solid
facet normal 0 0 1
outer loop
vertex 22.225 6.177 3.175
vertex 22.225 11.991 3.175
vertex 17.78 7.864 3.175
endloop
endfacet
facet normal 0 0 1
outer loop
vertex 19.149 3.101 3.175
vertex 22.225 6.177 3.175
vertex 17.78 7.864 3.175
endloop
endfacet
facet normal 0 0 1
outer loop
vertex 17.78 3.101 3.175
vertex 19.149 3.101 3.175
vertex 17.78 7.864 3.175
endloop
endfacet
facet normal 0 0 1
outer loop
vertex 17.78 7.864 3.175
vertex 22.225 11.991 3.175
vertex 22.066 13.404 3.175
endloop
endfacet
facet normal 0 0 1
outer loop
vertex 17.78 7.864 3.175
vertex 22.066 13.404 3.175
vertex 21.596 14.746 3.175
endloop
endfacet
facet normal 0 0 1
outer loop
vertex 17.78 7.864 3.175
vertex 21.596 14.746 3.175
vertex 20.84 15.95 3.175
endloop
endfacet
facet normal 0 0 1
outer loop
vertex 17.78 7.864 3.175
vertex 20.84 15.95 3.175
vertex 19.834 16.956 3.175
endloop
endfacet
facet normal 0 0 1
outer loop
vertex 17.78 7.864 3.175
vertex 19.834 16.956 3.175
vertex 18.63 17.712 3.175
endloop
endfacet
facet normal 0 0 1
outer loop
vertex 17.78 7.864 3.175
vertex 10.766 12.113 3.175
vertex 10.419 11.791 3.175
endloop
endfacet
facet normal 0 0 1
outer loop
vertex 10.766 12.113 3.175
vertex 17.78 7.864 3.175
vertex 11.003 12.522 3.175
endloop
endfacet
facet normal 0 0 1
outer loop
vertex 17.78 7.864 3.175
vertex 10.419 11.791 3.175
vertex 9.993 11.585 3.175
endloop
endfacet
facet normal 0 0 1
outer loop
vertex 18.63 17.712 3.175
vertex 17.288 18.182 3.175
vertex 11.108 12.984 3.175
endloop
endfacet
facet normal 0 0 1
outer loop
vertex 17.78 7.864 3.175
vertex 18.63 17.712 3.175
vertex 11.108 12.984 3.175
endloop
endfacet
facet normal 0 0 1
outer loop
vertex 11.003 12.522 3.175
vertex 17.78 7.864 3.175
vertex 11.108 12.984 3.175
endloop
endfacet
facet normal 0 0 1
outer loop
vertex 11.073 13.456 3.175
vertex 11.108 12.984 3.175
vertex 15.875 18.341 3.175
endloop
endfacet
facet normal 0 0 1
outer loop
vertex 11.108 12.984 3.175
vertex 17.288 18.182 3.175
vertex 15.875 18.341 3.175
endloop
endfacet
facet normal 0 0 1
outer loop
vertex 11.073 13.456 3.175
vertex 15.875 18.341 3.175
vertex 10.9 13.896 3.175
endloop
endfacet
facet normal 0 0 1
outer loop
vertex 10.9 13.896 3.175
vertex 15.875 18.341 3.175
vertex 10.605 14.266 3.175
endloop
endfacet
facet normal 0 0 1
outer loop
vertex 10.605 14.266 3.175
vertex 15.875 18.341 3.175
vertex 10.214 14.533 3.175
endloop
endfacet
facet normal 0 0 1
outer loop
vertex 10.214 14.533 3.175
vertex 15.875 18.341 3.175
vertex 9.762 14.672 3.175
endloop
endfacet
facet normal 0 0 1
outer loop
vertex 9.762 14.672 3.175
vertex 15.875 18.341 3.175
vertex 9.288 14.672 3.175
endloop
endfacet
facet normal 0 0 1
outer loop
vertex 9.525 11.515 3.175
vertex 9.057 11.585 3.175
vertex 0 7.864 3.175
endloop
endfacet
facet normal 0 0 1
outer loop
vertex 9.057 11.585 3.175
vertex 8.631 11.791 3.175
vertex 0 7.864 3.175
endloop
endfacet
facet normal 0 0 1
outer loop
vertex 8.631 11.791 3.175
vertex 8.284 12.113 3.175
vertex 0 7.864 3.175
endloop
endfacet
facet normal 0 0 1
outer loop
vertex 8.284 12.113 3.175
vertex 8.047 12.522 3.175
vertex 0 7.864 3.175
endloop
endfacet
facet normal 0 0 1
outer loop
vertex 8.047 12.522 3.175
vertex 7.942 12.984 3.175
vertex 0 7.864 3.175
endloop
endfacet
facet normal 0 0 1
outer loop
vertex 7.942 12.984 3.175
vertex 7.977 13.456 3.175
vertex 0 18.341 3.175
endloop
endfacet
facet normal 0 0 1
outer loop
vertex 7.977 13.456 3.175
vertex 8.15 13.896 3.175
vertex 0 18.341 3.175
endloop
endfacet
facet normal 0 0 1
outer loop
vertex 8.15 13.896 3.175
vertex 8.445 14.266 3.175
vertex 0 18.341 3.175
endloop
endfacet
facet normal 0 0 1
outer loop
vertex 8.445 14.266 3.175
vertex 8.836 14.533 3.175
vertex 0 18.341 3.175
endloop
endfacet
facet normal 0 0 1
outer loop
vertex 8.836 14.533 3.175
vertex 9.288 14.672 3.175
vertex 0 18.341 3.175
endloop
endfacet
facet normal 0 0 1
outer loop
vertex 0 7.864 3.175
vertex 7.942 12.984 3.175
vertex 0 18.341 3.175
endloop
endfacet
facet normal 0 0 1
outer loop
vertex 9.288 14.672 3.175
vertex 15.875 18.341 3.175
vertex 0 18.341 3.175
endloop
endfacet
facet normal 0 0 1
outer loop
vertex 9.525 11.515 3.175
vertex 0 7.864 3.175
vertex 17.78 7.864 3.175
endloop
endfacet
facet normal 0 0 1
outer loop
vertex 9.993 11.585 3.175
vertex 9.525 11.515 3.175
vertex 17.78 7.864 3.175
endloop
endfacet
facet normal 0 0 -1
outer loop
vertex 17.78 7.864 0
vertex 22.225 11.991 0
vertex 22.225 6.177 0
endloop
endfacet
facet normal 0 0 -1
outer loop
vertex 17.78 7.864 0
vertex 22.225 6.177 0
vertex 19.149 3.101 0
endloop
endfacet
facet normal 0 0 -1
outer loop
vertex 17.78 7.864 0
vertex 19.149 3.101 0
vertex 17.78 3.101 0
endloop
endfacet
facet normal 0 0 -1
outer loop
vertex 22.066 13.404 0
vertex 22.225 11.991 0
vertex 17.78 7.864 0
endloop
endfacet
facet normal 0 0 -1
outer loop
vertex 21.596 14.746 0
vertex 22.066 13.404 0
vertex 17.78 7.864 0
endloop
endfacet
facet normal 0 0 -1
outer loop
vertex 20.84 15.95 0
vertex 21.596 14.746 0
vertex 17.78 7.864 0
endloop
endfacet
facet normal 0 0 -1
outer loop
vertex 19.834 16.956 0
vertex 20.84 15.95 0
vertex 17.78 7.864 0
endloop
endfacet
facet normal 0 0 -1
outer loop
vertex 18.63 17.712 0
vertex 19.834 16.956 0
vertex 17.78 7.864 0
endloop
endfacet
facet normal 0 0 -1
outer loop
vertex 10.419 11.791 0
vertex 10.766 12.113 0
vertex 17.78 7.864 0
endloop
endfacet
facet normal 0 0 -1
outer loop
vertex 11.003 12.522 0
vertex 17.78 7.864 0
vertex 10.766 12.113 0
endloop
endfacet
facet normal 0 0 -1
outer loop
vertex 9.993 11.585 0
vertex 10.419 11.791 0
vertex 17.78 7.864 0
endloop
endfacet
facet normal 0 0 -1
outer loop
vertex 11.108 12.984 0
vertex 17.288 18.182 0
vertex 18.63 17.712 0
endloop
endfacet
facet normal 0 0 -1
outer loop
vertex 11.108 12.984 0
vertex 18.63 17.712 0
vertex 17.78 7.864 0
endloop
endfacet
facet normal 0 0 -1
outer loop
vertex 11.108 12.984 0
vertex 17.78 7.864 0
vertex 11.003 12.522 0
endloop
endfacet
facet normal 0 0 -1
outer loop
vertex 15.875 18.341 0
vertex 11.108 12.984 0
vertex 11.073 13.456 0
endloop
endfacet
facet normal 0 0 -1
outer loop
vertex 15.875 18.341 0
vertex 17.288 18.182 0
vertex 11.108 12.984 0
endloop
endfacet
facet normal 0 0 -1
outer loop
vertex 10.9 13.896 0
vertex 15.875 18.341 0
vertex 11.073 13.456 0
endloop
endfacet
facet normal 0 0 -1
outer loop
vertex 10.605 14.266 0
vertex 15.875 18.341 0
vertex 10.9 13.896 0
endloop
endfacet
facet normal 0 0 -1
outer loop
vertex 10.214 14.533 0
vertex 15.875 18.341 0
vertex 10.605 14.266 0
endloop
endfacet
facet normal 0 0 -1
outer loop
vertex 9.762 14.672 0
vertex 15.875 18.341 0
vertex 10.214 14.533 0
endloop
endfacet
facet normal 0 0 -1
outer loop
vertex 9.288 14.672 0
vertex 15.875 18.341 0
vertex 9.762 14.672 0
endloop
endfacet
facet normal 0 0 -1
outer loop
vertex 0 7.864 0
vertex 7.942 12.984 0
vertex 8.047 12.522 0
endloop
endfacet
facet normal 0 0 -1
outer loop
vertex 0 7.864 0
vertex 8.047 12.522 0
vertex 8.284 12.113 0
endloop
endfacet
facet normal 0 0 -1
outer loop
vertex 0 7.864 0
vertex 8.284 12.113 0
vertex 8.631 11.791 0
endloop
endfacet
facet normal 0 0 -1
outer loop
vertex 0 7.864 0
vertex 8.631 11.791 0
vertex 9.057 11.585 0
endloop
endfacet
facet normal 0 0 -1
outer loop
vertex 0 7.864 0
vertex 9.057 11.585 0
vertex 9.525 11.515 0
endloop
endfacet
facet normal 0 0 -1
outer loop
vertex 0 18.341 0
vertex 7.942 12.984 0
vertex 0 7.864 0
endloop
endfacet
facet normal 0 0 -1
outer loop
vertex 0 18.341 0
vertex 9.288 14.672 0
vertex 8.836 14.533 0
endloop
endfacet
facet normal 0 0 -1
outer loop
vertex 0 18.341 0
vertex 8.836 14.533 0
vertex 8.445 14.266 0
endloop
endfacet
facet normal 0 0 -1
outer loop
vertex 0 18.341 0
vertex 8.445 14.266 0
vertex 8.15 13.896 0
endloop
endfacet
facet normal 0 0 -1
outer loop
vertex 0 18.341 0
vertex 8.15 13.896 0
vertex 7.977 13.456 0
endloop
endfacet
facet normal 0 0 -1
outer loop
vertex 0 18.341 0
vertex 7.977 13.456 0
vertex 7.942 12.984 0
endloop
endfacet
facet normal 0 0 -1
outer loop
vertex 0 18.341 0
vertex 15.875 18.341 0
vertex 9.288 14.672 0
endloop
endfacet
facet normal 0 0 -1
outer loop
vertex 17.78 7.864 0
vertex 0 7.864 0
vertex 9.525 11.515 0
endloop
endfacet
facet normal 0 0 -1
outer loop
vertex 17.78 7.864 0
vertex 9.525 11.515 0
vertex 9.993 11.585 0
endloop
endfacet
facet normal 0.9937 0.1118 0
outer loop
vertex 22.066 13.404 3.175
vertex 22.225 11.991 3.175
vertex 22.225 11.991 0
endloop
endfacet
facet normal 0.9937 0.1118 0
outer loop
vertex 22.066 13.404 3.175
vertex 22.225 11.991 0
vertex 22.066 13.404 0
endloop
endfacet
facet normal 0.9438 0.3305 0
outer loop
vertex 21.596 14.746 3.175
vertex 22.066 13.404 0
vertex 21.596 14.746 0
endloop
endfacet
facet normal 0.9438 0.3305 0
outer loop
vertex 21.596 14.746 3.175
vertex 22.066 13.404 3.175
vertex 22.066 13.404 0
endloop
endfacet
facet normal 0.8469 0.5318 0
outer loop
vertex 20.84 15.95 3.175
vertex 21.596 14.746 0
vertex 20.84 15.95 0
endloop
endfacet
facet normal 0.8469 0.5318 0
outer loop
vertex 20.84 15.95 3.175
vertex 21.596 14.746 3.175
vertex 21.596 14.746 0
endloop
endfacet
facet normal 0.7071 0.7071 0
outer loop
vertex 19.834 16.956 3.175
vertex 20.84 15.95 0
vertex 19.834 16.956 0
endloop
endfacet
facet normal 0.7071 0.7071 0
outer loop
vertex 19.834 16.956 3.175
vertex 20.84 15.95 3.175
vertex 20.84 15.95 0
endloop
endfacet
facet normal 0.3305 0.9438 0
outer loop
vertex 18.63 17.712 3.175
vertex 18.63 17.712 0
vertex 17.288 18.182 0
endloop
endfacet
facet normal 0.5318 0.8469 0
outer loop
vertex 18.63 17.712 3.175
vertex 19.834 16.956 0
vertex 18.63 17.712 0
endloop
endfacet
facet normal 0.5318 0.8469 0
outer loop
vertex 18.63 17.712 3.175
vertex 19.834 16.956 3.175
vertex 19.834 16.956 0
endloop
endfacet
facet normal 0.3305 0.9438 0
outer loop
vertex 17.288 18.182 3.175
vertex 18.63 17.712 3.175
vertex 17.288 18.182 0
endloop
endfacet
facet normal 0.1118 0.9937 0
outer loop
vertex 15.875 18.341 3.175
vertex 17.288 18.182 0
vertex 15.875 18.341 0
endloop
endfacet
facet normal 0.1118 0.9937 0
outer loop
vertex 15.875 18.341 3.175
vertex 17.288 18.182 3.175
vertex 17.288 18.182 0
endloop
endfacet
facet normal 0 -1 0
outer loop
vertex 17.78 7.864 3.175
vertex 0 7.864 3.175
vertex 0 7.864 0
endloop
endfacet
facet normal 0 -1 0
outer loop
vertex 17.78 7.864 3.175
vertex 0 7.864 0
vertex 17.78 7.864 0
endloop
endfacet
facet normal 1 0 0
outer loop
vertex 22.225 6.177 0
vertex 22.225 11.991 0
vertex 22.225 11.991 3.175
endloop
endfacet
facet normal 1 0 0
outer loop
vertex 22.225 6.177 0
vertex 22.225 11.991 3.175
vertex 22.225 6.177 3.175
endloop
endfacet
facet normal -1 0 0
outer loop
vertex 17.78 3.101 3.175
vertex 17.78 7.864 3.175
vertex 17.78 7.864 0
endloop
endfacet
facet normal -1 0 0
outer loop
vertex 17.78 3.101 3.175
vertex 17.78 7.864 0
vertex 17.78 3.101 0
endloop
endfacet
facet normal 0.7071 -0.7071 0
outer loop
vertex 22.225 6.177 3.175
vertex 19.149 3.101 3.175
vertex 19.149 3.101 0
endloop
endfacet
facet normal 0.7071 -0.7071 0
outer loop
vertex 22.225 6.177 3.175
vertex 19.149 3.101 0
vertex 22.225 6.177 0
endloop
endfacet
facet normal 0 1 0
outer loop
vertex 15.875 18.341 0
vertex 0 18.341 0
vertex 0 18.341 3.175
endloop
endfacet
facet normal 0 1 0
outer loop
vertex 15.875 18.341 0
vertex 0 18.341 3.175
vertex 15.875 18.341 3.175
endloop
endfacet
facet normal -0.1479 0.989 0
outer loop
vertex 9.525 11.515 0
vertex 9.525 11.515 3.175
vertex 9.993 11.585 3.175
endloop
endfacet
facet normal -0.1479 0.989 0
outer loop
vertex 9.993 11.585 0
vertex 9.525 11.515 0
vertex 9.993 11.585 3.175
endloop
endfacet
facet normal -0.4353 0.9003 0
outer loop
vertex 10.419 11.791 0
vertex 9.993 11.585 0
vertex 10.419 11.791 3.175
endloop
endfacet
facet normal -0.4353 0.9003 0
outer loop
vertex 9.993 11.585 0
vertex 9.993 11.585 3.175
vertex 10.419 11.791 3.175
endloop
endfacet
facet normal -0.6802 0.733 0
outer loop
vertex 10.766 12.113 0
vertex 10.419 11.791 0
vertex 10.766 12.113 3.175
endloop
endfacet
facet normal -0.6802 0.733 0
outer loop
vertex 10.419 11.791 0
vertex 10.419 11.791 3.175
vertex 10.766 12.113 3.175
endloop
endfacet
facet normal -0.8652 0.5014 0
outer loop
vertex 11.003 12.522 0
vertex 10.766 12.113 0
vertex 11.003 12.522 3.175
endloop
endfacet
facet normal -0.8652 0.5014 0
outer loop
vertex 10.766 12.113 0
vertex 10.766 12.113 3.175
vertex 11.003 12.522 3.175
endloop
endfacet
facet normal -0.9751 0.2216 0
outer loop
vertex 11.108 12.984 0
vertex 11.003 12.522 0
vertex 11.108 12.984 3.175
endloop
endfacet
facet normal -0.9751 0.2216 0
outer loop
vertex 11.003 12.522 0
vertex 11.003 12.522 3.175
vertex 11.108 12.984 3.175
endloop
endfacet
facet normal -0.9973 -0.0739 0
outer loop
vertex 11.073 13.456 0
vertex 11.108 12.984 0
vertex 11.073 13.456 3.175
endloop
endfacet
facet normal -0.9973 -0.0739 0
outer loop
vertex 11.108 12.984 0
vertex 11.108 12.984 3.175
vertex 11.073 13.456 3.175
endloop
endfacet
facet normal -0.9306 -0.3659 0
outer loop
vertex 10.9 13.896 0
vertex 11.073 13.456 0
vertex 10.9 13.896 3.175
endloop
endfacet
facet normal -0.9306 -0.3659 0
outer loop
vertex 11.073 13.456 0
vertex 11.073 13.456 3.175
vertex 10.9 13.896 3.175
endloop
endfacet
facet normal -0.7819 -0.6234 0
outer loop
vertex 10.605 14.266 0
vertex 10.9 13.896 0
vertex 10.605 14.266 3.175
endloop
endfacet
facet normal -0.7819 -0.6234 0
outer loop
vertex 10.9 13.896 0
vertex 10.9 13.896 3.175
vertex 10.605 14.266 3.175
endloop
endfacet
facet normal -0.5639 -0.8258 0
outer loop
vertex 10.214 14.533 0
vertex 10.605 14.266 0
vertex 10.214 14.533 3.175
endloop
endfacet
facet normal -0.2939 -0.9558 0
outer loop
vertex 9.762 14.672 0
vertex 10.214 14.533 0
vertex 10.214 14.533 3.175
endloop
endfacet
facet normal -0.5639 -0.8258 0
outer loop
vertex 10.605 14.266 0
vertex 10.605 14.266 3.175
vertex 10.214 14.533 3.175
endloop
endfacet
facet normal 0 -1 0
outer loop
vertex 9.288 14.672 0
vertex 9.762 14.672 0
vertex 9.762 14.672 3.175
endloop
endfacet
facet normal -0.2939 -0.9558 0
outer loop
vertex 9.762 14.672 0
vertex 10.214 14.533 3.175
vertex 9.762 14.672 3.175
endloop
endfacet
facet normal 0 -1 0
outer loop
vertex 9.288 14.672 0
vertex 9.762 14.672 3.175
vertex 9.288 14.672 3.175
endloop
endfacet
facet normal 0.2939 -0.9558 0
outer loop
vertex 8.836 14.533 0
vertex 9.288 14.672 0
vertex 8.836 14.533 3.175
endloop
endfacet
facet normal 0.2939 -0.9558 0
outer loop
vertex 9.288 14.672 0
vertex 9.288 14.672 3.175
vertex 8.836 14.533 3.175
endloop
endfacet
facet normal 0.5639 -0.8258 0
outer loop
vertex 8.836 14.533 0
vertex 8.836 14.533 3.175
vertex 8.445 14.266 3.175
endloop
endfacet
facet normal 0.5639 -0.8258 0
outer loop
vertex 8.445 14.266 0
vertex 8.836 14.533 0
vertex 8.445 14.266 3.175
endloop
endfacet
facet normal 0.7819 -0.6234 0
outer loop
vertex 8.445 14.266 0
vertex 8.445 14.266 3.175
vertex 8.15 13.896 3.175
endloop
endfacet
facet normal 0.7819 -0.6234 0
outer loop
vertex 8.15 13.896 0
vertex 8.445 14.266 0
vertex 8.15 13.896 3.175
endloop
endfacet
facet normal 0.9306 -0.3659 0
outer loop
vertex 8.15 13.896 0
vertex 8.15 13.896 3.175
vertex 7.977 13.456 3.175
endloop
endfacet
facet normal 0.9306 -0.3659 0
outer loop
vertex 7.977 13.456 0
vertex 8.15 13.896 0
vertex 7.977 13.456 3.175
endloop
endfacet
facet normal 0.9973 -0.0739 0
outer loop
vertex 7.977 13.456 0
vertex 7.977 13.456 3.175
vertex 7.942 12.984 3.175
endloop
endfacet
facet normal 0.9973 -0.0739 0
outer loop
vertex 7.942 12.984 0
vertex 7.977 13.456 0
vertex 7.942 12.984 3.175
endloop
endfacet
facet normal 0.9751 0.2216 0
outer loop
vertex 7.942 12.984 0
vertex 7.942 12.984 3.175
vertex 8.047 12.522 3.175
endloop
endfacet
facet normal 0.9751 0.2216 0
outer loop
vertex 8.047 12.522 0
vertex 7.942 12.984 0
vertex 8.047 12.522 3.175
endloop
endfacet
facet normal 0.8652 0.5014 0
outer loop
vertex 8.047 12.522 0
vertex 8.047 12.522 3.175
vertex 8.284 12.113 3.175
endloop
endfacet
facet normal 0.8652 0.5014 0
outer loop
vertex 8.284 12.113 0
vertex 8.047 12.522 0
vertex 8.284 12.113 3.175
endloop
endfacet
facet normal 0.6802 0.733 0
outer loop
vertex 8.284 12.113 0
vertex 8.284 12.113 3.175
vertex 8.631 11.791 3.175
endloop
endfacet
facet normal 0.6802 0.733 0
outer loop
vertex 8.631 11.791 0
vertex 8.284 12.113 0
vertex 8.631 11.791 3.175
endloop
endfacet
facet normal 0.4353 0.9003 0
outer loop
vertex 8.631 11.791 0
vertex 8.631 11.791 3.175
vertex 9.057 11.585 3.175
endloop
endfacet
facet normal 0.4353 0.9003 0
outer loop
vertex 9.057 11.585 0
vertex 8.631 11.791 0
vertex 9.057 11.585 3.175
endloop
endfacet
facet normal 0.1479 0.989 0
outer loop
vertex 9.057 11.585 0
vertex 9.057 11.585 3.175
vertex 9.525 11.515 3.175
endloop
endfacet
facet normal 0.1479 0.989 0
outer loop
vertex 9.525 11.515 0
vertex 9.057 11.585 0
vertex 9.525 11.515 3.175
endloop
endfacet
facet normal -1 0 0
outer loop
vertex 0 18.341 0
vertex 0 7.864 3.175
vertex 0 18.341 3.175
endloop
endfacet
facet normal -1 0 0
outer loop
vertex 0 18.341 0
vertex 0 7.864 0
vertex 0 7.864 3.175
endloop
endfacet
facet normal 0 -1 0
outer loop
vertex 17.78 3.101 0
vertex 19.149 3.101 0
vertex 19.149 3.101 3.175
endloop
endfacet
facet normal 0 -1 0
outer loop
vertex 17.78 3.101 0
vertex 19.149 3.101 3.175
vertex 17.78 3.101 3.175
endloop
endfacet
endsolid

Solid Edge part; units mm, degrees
sketch "Sketch1" plane through (0, 0, 0) normal (0, 0, 1) x (1, 0, 0)
  line L0 (0, 3.1011) -> (0, 18.3411)
  line L1 (0, 18.3411) -> (22.225, 18.3411)
  line L2 (22.225, 18.3411) -> (22.225, 3.1011)
  line L3 (22.225, 3.1011) -> (0, 3.1011)
extrude "Protrusion1" add sketch "Sketch1" along normal blind 3.175
sketch "Sketch2" plane through (14.2875, 8.8161, 3.175) normal (0, 0, 1) x (1, 0, 0)
  line L0 (4.8619, -5.715) -> (7.9375, -2.6394)
  line L1 (7.9375, -5.715) -> (7.9375, -2.6394)
  line L2 (4.8619, -5.715) -> (7.9375, -5.715)
  line L3 (-14.2875, -5.715) -> (-14.2875, -0.9525)
  line L4 (-14.2875, -0.9525) -> (3.4925, -0.9525)
  line L5 (3.4925, -0.9525) -> (3.4925, -5.715)
  line L6 (3.4925, -5.715) -> (-14.2875, -5.715)
  dimension "D1" = 4.7625
  dimension "D2" = 17.78
extrude "Cutout1" cut sketch "Sketch2" against normal through all
hole "Hole_2" at (9.525, 13.1023, 3.175) direction (0, 0, -1) diameter 3.175 end up to next
fillet "Round_5" radius 6.35 1 edges at (22.225, 18.3411, 1.5875)
